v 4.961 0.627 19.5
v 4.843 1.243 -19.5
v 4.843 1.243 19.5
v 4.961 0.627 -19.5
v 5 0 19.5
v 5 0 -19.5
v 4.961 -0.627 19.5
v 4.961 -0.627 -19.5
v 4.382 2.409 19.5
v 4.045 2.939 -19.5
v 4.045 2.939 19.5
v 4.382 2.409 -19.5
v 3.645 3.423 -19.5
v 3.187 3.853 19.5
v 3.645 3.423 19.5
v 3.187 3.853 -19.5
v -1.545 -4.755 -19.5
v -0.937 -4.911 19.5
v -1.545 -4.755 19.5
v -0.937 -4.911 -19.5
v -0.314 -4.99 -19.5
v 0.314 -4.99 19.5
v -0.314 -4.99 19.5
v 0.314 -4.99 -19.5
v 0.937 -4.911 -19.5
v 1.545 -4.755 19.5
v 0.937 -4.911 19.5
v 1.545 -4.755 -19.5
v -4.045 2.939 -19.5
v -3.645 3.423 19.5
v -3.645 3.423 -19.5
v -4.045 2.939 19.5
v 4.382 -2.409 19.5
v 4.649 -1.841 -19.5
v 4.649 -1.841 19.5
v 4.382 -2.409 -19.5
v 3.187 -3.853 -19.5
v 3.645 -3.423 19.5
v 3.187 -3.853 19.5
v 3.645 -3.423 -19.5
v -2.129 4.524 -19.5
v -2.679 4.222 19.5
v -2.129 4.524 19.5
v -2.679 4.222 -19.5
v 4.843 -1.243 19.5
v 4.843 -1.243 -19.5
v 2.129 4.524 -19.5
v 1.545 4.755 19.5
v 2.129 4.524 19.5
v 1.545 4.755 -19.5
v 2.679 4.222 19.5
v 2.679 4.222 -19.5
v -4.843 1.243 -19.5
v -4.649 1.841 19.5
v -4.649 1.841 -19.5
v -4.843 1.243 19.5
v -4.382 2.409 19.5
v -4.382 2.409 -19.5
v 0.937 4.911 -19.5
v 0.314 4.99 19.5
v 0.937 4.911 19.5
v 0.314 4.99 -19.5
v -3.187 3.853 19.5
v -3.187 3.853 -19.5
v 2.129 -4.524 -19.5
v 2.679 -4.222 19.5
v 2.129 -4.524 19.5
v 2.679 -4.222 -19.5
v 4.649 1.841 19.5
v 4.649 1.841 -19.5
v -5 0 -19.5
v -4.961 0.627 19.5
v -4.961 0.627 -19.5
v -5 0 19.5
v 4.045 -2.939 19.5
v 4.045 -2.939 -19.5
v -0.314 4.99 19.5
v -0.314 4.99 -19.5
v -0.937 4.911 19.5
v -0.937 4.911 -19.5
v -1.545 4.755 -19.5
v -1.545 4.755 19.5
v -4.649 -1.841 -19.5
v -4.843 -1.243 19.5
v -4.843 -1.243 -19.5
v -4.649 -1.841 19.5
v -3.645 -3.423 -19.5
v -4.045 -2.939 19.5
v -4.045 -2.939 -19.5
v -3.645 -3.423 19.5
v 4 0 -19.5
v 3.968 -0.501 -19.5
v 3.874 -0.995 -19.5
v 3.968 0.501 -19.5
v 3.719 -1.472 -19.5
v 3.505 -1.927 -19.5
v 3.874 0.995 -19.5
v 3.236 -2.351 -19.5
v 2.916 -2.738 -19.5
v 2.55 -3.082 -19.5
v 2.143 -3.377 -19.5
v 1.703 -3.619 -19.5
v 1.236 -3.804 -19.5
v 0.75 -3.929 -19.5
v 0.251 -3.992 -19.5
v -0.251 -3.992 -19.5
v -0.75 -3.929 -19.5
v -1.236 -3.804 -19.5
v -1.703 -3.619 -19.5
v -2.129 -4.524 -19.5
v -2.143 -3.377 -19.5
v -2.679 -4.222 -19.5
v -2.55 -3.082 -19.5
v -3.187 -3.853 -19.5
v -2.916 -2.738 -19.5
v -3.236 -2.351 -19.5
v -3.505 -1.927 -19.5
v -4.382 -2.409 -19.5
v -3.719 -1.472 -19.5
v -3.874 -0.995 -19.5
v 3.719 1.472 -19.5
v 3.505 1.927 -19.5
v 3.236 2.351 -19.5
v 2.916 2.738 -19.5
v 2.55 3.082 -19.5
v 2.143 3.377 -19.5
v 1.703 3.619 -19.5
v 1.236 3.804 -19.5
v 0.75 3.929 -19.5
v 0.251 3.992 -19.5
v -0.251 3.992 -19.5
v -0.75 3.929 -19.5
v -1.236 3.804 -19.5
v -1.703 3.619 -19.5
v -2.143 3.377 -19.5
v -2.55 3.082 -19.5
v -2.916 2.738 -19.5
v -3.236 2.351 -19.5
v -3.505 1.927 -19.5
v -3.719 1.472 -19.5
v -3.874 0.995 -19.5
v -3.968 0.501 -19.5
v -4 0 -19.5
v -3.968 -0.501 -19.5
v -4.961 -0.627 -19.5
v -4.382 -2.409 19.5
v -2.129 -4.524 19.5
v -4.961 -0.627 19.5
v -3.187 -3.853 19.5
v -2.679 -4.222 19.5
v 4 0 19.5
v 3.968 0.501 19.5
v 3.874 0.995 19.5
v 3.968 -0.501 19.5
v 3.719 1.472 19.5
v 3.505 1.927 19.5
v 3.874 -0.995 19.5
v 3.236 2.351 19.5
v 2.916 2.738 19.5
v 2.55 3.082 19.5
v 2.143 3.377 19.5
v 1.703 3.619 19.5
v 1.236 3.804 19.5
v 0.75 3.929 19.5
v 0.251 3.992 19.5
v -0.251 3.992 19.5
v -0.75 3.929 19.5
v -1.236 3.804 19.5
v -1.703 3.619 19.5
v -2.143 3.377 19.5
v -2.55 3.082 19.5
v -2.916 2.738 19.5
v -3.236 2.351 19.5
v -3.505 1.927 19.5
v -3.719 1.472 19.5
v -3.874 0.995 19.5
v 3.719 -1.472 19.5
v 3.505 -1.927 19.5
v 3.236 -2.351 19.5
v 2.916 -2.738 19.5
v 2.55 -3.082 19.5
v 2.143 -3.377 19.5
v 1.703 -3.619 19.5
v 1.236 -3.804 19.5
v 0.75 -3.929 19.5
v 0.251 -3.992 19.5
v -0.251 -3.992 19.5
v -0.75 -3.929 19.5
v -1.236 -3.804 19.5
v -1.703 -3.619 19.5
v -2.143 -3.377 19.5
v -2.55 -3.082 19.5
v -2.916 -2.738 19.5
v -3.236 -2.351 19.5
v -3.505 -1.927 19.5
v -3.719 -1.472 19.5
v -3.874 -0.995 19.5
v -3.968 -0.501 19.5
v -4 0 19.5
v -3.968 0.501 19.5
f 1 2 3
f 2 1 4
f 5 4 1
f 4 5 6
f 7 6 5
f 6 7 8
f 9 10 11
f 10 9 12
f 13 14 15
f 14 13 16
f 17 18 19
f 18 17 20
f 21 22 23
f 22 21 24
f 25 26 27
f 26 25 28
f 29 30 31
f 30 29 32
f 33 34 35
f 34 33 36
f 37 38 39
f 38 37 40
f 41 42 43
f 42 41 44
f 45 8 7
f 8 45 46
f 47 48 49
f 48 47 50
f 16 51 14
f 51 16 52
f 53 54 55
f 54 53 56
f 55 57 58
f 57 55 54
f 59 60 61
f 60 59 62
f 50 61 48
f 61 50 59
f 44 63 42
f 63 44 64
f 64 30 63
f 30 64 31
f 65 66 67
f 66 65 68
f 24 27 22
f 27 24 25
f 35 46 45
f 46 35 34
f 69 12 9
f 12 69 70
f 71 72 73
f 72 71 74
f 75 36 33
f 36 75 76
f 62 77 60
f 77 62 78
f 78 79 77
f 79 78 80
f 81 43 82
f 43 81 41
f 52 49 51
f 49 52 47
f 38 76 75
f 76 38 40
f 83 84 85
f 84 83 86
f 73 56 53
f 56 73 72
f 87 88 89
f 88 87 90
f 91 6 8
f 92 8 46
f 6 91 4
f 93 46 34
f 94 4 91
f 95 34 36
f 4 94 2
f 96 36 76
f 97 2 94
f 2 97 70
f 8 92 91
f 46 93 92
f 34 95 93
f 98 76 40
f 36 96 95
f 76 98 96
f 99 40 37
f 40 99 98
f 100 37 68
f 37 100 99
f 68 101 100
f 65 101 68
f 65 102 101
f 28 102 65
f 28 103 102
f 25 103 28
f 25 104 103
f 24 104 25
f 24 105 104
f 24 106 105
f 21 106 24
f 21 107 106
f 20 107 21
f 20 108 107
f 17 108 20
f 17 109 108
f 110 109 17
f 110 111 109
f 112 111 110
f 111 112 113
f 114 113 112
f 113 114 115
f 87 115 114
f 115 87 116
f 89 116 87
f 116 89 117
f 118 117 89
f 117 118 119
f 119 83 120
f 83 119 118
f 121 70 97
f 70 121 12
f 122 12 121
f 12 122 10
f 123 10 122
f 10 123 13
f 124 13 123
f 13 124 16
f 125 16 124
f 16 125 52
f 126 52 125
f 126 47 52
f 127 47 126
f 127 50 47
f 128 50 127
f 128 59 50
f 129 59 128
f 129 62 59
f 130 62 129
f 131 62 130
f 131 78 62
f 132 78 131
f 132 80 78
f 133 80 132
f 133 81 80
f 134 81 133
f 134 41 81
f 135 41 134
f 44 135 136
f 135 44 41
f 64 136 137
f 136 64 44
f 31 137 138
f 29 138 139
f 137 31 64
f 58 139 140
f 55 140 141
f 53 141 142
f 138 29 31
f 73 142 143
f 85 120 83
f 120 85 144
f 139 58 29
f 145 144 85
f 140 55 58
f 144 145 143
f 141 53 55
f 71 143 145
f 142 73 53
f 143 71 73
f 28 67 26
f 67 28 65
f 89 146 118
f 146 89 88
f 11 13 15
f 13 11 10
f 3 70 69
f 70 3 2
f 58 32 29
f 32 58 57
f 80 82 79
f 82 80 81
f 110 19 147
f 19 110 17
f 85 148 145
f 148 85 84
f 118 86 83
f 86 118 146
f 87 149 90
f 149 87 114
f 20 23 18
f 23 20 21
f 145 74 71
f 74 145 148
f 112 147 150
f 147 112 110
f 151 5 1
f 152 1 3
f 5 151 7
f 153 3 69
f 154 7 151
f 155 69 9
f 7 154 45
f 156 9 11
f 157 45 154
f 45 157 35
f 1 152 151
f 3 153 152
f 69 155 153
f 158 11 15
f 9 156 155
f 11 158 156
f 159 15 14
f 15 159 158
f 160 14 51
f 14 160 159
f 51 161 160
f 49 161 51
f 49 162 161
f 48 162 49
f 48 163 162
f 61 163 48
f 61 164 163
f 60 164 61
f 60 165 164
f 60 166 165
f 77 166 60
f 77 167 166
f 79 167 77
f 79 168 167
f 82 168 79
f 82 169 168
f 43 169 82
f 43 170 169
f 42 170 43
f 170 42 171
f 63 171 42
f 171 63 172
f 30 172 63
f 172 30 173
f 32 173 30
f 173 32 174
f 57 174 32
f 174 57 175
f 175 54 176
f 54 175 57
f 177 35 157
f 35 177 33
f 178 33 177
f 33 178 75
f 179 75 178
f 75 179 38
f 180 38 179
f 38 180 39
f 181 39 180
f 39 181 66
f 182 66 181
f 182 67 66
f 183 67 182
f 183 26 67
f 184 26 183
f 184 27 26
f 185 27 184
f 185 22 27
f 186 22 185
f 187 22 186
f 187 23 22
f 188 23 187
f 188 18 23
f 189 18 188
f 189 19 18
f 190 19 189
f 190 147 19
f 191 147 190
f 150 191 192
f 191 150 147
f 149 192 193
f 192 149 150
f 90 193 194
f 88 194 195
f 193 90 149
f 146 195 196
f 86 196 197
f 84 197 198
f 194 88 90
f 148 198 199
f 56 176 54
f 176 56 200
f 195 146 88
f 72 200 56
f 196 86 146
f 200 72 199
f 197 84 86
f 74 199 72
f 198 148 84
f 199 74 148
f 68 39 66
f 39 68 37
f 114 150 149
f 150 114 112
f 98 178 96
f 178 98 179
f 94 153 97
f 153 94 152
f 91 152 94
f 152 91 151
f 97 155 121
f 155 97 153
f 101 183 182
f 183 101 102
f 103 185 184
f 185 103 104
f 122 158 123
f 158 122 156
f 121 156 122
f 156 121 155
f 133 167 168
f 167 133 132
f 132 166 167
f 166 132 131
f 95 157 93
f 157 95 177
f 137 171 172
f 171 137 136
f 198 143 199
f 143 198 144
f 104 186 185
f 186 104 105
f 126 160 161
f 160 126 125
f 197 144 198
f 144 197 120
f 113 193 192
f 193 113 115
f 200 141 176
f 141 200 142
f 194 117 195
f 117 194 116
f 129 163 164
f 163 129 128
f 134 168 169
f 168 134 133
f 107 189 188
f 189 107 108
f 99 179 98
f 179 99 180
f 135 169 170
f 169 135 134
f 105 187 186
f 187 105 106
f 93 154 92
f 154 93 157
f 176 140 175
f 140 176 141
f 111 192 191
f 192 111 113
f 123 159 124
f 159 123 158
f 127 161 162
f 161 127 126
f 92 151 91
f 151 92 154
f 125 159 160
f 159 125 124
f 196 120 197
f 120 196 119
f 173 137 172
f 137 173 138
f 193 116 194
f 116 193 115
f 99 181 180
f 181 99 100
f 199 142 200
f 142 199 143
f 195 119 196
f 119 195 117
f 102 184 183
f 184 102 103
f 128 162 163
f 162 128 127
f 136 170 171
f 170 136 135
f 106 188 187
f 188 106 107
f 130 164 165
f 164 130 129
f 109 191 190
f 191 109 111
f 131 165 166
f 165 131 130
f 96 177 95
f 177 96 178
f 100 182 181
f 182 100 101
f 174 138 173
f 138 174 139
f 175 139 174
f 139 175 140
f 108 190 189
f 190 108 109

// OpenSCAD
$fn = 50;


difference() {
	union() {
		translate(v = [0, 0, -19.5000000000]) {
			cylinder(h = 39, r = 5.0000000000);
		}
	}
	union() {
		translate(v = [0, 0, -100.0000000000]) {
			cylinder(h = 200, r = 4.0000000000);
		}
	}
}
